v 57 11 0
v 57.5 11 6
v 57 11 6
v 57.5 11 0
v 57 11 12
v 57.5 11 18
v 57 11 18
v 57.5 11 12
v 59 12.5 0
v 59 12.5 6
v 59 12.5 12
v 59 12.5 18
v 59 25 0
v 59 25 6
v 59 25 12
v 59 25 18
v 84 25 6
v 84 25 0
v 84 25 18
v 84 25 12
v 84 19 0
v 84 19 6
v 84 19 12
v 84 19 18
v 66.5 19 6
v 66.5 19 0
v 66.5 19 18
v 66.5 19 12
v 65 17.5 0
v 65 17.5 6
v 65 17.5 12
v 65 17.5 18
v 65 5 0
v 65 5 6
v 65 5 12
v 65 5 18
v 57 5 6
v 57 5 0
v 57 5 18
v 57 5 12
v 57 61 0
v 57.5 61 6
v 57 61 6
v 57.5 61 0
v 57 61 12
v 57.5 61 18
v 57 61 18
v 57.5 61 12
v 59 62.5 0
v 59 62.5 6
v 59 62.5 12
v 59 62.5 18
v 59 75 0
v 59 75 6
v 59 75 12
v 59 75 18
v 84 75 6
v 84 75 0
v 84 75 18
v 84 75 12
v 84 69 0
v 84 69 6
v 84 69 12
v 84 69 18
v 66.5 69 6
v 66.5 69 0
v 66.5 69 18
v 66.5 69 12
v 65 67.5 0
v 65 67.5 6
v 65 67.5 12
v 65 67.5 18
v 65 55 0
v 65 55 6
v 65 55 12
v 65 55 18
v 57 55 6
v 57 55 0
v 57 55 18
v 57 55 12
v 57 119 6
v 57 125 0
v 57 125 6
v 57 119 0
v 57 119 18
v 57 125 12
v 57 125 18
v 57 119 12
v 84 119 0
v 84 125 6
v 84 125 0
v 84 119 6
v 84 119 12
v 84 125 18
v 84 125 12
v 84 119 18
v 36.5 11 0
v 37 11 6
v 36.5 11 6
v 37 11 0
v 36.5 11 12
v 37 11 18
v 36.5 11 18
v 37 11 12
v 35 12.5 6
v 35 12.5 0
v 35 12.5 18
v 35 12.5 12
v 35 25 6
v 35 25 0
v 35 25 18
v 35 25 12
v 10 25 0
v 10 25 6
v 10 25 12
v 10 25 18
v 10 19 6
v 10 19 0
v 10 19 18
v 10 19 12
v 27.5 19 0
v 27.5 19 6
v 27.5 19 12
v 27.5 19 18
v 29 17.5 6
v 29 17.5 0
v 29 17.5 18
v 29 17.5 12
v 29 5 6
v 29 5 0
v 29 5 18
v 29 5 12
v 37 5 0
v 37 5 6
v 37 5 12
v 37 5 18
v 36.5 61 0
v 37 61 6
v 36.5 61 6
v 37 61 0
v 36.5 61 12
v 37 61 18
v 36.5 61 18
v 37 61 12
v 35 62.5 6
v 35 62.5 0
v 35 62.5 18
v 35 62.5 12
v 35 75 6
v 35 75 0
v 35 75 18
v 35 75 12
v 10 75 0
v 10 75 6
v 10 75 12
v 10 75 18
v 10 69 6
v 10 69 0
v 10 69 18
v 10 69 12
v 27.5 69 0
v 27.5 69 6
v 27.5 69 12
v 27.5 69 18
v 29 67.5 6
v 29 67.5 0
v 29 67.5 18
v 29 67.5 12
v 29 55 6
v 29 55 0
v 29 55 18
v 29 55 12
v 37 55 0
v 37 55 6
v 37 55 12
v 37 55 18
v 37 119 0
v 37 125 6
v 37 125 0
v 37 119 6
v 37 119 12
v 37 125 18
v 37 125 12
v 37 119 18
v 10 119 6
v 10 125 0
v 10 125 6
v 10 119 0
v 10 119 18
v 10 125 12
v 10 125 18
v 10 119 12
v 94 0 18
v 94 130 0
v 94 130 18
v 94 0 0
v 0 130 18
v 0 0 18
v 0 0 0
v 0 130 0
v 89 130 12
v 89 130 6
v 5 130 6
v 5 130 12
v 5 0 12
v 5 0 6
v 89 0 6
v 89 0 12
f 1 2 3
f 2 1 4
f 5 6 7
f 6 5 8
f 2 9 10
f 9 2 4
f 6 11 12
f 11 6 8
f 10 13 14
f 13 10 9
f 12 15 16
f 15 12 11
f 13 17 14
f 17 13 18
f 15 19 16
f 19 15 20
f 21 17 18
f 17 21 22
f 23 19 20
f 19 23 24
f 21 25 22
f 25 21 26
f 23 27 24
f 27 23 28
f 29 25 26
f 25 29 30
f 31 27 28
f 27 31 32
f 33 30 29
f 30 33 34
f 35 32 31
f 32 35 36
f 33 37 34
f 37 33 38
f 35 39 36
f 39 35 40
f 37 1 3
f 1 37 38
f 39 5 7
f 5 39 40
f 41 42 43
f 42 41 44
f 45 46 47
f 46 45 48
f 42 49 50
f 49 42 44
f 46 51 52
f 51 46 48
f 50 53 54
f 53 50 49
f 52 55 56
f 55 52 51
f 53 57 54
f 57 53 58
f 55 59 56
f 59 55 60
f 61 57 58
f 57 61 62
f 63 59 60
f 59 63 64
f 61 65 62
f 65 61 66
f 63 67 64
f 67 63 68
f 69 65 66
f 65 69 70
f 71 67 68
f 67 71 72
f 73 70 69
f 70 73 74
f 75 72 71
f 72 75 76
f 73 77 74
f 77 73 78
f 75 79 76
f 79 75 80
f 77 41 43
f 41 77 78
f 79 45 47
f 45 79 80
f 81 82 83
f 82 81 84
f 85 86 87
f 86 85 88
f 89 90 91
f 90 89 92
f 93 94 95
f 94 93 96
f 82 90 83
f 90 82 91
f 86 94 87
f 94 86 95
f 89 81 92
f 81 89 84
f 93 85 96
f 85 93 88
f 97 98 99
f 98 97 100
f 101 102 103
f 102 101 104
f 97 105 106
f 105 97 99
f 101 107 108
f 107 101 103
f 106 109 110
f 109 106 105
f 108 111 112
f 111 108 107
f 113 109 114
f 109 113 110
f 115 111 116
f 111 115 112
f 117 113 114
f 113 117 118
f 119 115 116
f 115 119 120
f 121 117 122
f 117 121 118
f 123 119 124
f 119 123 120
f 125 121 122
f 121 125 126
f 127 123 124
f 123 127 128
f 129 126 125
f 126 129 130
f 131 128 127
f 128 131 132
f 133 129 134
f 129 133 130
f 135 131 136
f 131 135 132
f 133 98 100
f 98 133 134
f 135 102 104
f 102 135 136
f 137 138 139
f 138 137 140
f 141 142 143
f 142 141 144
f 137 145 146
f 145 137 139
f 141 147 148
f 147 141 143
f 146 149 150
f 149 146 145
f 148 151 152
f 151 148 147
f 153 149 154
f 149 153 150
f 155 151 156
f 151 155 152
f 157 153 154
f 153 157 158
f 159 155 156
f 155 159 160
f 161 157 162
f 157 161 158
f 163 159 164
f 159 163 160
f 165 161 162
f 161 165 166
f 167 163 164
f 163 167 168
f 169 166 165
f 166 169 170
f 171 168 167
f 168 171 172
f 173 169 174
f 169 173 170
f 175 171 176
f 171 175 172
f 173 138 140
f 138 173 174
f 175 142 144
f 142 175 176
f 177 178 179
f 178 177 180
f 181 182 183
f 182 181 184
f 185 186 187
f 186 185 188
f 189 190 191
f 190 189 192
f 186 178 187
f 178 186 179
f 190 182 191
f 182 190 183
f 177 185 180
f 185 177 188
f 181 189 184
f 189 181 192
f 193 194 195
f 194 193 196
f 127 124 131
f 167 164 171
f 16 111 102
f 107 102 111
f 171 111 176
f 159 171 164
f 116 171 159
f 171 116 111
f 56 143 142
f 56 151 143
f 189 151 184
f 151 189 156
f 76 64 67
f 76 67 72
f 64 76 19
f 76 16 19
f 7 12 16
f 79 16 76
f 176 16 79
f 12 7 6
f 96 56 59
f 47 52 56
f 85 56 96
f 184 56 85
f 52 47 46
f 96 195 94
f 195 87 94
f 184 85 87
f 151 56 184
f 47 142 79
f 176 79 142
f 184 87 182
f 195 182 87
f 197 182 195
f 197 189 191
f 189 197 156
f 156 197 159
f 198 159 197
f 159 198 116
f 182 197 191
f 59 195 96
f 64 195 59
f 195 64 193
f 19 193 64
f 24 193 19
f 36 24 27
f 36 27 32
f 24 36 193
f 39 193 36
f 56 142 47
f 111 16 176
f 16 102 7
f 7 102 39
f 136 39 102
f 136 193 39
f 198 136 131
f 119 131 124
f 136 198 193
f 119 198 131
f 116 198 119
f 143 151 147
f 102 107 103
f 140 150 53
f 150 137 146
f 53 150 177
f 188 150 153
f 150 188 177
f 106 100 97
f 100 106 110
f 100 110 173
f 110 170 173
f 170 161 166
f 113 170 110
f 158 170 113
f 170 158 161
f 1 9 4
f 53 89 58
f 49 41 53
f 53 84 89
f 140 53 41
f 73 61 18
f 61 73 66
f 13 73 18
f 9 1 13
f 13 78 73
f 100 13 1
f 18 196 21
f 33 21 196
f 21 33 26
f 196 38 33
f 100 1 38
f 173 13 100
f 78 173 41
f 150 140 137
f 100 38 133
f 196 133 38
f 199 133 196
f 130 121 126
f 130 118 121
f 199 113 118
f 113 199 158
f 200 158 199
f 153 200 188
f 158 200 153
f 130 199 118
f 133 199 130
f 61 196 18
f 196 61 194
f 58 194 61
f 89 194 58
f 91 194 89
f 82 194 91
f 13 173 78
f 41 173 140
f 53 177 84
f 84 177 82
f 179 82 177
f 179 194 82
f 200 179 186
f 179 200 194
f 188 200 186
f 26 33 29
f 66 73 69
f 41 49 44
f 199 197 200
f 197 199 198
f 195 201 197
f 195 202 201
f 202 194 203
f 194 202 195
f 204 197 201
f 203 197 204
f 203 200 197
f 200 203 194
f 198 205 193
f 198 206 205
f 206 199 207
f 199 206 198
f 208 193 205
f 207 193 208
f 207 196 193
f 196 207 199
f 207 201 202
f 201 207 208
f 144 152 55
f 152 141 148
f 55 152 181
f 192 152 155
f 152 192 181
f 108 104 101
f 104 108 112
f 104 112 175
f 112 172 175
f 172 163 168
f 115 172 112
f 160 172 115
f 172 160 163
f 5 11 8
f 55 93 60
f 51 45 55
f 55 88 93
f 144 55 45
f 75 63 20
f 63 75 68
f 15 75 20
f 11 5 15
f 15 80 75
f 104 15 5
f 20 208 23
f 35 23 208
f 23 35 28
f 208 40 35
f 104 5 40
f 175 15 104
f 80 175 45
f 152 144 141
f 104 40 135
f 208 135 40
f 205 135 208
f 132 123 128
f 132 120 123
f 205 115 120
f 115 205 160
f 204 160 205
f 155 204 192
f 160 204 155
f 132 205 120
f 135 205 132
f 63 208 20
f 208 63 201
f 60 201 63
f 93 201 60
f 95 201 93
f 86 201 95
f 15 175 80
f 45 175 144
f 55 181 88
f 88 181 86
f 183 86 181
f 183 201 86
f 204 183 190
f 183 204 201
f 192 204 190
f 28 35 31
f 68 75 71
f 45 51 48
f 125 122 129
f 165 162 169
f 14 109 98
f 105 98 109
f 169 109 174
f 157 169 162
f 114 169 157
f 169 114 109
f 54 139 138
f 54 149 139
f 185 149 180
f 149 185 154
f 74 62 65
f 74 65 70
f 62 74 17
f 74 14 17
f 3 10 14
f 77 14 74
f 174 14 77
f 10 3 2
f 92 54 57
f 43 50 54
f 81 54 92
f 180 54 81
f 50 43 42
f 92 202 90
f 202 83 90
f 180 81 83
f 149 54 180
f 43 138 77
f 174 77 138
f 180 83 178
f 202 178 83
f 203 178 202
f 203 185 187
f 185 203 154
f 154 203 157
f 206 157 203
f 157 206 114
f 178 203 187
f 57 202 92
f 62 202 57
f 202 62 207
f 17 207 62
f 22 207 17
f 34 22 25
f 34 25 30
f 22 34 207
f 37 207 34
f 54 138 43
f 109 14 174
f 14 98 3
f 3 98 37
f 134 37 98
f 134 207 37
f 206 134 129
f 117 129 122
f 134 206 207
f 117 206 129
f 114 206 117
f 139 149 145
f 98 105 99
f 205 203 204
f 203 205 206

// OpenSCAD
is_laser_cut = true;
laser_material_thickness = 6;
threed_print_thickness = 5;
material_thickness = is_laser_cut ?
                        laser_material_thickness :
                        threed_print_thickness;

pin_diameter = 6;
pin_radius = pin_diameter/2;

gripper_track_long_horizontal_leg_length = 25;
gripper_track_short_horizontal_leg_length = 2;
gripper_track_vertical_length = 20;

cutter_track_length = gripper_track_long_horizontal_leg_length + gripper_track_short_horizontal_leg_length;

vertical_track_separation = 50;

slider_side = gripper_track_long_horizontal_leg_length + gripper_track_short_horizontal_leg_length;
slider_vertical_travel = 20;
total_slider_travel = slider_side + slider_vertical_travel - 4*pin_radius + gripper_track_vertical_length;

horizontal_track_separation = 20;

slider_margin = 5;
slider_width = 2*cutter_track_length + horizontal_track_separation + 2*slider_margin;
slider_length = 185;
slider_thickness = material_thickness;

top_guide_wall_thickness = material_thickness;
side_guide_wall_thickness = 5;
guide_width = slider_width + 2*side_guide_wall_thickness;
guide_length = 2*slider_margin + 2*vertical_track_separation + gripper_track_vertical_length;
guide_thickness = 2*top_guide_wall_thickness + slider_thickness;

pin_pad_thickness = 2;
pin_pad_radius = pin_radius + horizontal_track_separation/2 - 0.5;
pin_stickout = 15;
pin_height = pin_pad_thickness + guide_thickness + pin_stickout;


module gripper_track(h) {
    curve_cut = pin_radius/2;
    
    p1 = [ pin_radius,
           pin_radius + gripper_track_vertical_length - 2*pin_radius];
    p2 = [ pin_radius + gripper_track_long_horizontal_leg_length - 2*pin_radius,
           pin_radius + gripper_track_vertical_length - 2*pin_radius];
    p3 = [ pin_radius + gripper_track_long_horizontal_leg_length - 2*pin_radius,
           pin_radius];
    p4 = [ pin_radius + gripper_track_long_horizontal_leg_length + gripper_track_short_horizontal_leg_length - 2*pin_radius,
           pin_radius];
    
    //polygon(points = [p1,p2,p3,p4]);
    
    linear_extrude(height = h)
    polygon(points = [
        p1 + [-pin_radius, -pin_radius],
        p2 + [-pin_radius, -pin_radius] + [-curve_cut,0],
        p2 + [-pin_radius, -pin_radius] + [0,-curve_cut],
        p3 + [-pin_radius, -pin_radius],
        p4 + [ pin_radius, -pin_radius],
        
        p4 + [ pin_radius,  pin_radius],
        p3 + [ pin_radius,  pin_radius] + [curve_cut,0],
        p3 + [ pin_radius,  pin_radius] + [0,curve_cut],
        p2 + [ pin_radius,  pin_radius],
        p1 + [-pin_radius,  pin_radius]
    ]);
}

module cutter_track(h) {
    cube([cutter_track_length, 2 * pin_radius, h]);
}

module top_gripper_drive_track(h) {
    p1 = [ pin_radius,
           pin_radius ];
    p2 = [ pin_radius + slider_side - 2*pin_radius,
           pin_radius + slider_side - 2*pin_radius];
    p3 = [ pin_radius + slider_side - 2*pin_radius,
           pin_radius + slider_vertical_travel + slider_side - 2*pin_radius];
    //polygon(points = [p1,p2,p3]);

    linear_extrude(height = h)
    polygon(points = [
        p1 + [-pin_radius, pin_radius],
        p1 + [-pin_radius,-pin_radius],
        p1 + [ pin_radius,-pin_radius],
        
        p2 + [ pin_radius,-pin_radius],
        
        p3 + [ pin_radius, pin_radius],
        p3 + [-pin_radius, pin_radius],
        
        p2 + [-pin_radius, pin_radius]
    ]);
}

module bottom_gripper_drive_track(h) {
    p1 = [ pin_radius,
           pin_radius ];
    p2 = [ pin_radius ,
           pin_radius + slider_vertical_travel/2];
    p3 = [ pin_radius + (slider_side - 2*pin_radius),
           pin_radius + slider_vertical_travel/2 + (slider_side - 2*pin_radius)];
    p4 = [ pin_radius + slider_side - 2*pin_radius,
           pin_radius + slider_vertical_travel + (slider_side - 2*pin_radius)];
    //polygon(points = [p1,p2,p3,p4]);

    linear_extrude(height = h)
    polygon(points = [
        p1 + [-pin_radius,-pin_radius],
        p1 + [ pin_radius,-pin_radius],

        p2 + [ pin_radius,-pin_radius],
        
        p3 + [ pin_radius,-pin_radius],
        
        p4 + [ pin_radius, pin_radius],
        p4 + [-pin_radius, pin_radius],
        
        p3 + [-pin_radius, pin_radius],

        p2 + [-pin_radius, pin_radius]
    ]);
}







module cutter_drive_track(h) {
    p1 = [ pin_radius,
           pin_radius ];
    p2 = [ pin_radius,
           pin_radius + gripper_track_vertical_length - 2*pin_radius + slider_vertical_travel];
    p3 = [ pin_radius + slider_side - 2*pin_radius,
           pin_radius + gripper_track_vertical_length - 2*pin_radius + slider_vertical_travel + slider_side - 2*pin_radius];
    //polygon(points = [p1,p2,p3]);

    linear_extrude(height = h)
    polygon(points = [
        p1 + [-pin_radius,-pin_radius],
        p1 + [ pin_radius,-pin_radius],
        
        p2 + [ pin_radius,-pin_radius],
        
        p3 + [ pin_radius,-pin_radius], 
        p3 + [ pin_radius, pin_radius],
        p3 + [-pin_radius, pin_radius],
        
        p2 + [-pin_radius, pin_radius]
    ]);
}

module slider() {
    difference() {
        union() {
            cube([slider_width, slider_length, slider_thickness]);
            
            handle_width = 10;
            translate([slider_width/2-handle_width/2,slider_length,0])
            cube([handle_width,40,slider_thickness]);
        }
    
        track_height = 100;
        translate([slider_margin, slider_margin, -10]) {
            translate([0,gripper_track_vertical_length-2*pin_radius+2*vertical_track_separation,0])
            cutter_drive_track(track_height);
        
            translate([0,vertical_track_separation+gripper_track_vertical_length-2*pin_radius,0])
            top_gripper_drive_track(track_height);
        
            translate([0, gripper_track_vertical_length-2*pin_radius, 0])
            bottom_gripper_drive_track(track_height);
    
            translate([2*cutter_track_length+horizontal_track_separation,0,0])
            mirror([1,0,0]) {
                translate([0,gripper_track_vertical_length-2*pin_radius+2*vertical_track_separation,0])
                cutter_drive_track(track_height);
            
                translate([0,vertical_track_separation+gripper_track_vertical_length-2*pin_radius,0])
                top_gripper_drive_track(track_height);
            
                translate([0, gripper_track_vertical_length-2*pin_radius, 0])
                bottom_gripper_drive_track(track_height);
            }
        }
    }
}

module guide() {
    difference() {
        cube([guide_width, guide_length, guide_thickness]);

        translate([side_guide_wall_thickness,-20,top_guide_wall_thickness])
        cube([guide_width-2*side_guide_wall_thickness, 200, slider_thickness]);

        track_height = 100;
    
        translate([side_guide_wall_thickness+slider_margin,slider_margin,-10]) {
            gripper_track(track_height);
            
            translate([0,vertical_track_separation,0])
            gripper_track(track_height);
            
            translate([0,2*vertical_track_separation+gripper_track_vertical_length-2*pin_radius,0])
            cutter_track(track_height);
        
            translate([2*cutter_track_length+horizontal_track_separation,0,0])
            mirror([1,0,0]) {
                gripper_track(track_height);
            
                translate([0,vertical_track_separation,0])
                gripper_track(track_height);
                
                translate([0,2*vertical_track_separation+gripper_track_vertical_length-2*pin_radius,0])
                cutter_track(track_height);
            }
        }
    }
}

module pin() {
    cube([2*pin_radius, 2*pin_radius, pin_height]);
    
    translate([pin_radius,pin_radius,0])
    cylinder(r = pin_pad_radius, h = pin_pad_thickness);
}





$t = 0;
delta = $t < 0.5 ?
            -2*$t*(total_slider_travel) :
            -2*(1-$t)*(total_slider_travel);

//translate([side_guide_wall_thickness, delta, top_guide_wall_thickness])
//slider();

guide();

//translate([100,0,0])
//pin();
